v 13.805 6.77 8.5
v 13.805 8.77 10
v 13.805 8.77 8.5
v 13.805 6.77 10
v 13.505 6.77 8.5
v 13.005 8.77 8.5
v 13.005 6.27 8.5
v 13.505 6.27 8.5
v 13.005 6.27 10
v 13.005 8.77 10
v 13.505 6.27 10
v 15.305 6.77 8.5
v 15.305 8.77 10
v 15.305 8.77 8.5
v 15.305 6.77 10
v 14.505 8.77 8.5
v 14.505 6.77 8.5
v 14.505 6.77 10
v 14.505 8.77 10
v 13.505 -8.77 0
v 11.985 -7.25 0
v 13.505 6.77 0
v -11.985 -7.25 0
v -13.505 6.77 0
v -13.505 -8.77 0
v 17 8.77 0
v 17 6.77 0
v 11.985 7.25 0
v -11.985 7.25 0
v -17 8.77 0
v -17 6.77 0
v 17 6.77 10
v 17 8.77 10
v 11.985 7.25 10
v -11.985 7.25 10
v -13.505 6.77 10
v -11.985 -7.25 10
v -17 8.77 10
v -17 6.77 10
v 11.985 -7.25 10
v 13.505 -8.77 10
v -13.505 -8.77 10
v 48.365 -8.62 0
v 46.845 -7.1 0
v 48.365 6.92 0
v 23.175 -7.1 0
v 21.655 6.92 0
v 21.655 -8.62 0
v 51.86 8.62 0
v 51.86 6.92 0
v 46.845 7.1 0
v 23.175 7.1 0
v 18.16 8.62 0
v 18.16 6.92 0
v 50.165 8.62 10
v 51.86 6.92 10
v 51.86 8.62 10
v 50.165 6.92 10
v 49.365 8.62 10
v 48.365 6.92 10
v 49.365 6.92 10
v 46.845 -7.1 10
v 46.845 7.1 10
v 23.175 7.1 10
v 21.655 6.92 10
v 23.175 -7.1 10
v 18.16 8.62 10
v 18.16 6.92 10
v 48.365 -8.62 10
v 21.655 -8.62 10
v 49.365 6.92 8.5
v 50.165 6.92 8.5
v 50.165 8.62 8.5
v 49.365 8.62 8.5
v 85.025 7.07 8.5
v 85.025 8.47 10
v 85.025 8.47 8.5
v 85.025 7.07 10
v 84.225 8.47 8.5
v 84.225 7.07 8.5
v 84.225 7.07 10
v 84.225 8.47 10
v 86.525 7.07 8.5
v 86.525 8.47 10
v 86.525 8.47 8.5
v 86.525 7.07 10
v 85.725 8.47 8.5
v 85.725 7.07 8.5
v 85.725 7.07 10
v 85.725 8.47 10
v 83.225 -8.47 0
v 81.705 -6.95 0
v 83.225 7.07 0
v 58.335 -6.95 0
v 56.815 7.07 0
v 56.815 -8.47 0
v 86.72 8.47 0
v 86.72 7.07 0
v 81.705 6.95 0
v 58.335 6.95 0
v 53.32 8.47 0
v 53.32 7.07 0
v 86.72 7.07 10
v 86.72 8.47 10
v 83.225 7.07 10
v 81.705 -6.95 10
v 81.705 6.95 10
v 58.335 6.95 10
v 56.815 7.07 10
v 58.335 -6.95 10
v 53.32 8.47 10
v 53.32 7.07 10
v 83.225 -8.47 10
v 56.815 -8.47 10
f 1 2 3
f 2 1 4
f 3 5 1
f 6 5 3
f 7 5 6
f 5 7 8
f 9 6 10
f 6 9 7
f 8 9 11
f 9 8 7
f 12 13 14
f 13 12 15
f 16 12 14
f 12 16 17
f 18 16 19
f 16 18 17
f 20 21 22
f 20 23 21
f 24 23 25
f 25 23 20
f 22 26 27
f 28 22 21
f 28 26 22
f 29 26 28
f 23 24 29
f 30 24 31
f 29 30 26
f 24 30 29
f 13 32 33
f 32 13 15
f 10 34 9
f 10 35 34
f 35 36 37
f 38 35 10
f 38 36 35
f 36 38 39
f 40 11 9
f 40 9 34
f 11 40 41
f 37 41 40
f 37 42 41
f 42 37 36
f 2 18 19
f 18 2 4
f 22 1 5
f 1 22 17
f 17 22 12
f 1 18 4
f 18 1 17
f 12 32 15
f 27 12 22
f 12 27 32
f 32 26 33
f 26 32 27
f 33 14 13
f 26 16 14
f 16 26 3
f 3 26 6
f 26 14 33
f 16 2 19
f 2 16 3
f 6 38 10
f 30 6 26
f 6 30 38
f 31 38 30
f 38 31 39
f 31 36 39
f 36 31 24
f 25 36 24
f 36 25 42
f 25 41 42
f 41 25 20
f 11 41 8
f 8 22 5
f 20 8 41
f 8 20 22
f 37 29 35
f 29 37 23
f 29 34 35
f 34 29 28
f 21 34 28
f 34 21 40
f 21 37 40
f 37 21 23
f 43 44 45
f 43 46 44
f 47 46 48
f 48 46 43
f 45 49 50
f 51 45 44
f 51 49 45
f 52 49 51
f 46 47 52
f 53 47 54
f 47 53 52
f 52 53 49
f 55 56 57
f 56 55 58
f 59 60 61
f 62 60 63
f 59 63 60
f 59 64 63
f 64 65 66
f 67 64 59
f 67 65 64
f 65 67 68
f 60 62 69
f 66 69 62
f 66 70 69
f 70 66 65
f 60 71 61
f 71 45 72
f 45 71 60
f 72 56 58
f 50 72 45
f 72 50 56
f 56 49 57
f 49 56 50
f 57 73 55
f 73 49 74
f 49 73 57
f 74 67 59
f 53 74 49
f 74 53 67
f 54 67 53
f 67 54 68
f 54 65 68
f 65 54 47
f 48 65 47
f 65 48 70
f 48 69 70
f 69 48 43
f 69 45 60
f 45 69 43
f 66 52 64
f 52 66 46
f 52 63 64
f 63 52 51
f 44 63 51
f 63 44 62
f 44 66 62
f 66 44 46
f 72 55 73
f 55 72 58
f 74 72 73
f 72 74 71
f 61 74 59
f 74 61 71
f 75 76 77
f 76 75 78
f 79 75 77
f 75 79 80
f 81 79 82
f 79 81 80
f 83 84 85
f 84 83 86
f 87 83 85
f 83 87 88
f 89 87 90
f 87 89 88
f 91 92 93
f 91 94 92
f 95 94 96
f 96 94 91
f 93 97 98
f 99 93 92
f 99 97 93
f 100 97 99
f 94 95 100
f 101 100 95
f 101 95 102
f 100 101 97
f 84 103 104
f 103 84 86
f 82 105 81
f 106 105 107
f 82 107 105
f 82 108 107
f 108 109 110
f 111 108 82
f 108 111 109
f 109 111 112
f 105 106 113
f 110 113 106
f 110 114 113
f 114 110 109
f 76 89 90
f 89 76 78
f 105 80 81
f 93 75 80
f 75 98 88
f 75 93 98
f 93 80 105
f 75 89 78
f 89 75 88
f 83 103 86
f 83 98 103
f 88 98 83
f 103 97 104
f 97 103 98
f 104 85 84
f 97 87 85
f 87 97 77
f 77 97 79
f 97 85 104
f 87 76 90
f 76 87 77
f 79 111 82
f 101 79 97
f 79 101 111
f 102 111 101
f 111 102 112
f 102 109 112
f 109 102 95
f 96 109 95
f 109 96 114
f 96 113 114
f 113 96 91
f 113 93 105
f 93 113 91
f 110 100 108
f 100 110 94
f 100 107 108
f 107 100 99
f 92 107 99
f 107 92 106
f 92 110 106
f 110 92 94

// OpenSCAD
// ============================================================
// Passungs-Pruefling fuer die Einschubschiene im Badspiegel
//
// Das ist NICHT das fertige Gehaeuse, sondern nur eine 10 mm dicke
// Scheibe vom Querschnitt, dreimal nebeneinander mit unterschiedlichem
// Spiel. Zweck: in zwanzig Minuten Druckzeit herausfinden, welches Mass
// in die Schiene passt, statt nach zwei Stunden Druck zu merken, dass
// es klemmt oder wackelt.
//
// So gehts: alle drei drucken, der Reihe nach in die Schiene schieben.
// Der beste ist der, der ohne Gewalt hineingeht und nicht von selbst
// wieder herausfaellt. Seine Nummer steht eingepraegt auf der Stirnseite.
// Diese Nummer sagst du mir, dann baue ich das Gehaeuse mit dem Wert.
//
// DRUCKAUSRICHTUNG: stehend, so wie die Datei es anlegt. Dadurch ist
// jede Druckschicht exakt der Querschnitt, den wir pruefen wollen.
// Liegend gedruckt waere die Hoehe durch die Schichtdicke gerastert und
// die Messung waere nichts wert.
// Ohne Support, ohne Brim. Falls die erste Schicht breiter ausfaellt
// (Elefantenfuss), im Slicer die Elefantenfuss-Korrektur einschalten.
// ============================================================

// ---- Gemessen am Original, 14.08.2026, Messschieber ----
korpus_breite = 27.01;   // Gehaeuse aussen, breite Seite
korpus_hoehe  = 17.54;   // Gehaeuse aussen, flache Seite
wand          = 1.52;    // Wandstaerke, direkt gemessen
fluegel_dicke = 2.00;    // Dicke der seitlichen Fluegel

// Ueberstand je Seite, gerechnet aus zwei Messungen: ueber die
// Fluegelspitzen 34.00, ueber den Korpus 27.01, Differenz halbiert.
fluegel_ueberstand = 3.495;

// Die Fluegel schliessen buendig mit der Displayseite ab (16.08.2026). Ihre Mitte liegt also eine halbe Fluegeldicke unter der
// Oberkante.
fluegel_mitte_ab_display = fluegel_dicke / 2;

// ---- Pruefling-Einstellungen ----
pruefling_laenge = 10;      // Scheibendicke, reicht zum Einschieben
spiel_liste      = [0, 0.15, 0.30];  // je Seite, wird vom Mass abgezogen
abstand          = 8;       // Luecke zwischen den Prueflingen auf dem Bett

// ============================================================

// Querschnitt als 2D-Profil. spiel wird auf JEDER Seite abgezogen,
// die Aussenmasse schrumpfen also um das Doppelte.
module profil(spiel) {
    difference() {
        union() {
            square([korpus_breite - 2*spiel, korpus_hoehe - 2*spiel], center = true);
            // Fluegel links und rechts. Die Displayseite liegt hier oben,
            // also in +y, deshalb wird der Abstand von dort abgezogen.
            for (seite = [-1, 1])
                translate([seite * (korpus_breite - 2*spiel) / 2,
                           korpus_hoehe/2 - fluegel_mitte_ab_display])
                    square([2 * fluegel_ueberstand, fluegel_dicke - 2*spiel],
                           center = true);
        }
        // Hohlraum. Nur damit der Pruefling sich aehnlich verformt wie
        // das spaetere Gehaeuse und nicht als Vollklotz alles aufweitet.
        square([korpus_breite - 2*spiel - 2*wand,
                korpus_hoehe  - 2*spiel - 2*wand], center = true);
    }
}

module pruefling(spiel, nummer) {
    difference() {
        linear_extrude(height = pruefling_laenge) profil(spiel);
        // Nummer als Kerben im rechten Fluegel: 0, 1 oder 2 Kerben.
        // Bis 25.10.2026 stand hier eine eingepraegte Ziffer in der Mitte,
        // die lag im Hohlraum und kam nie aufs Teil.
        for (k = [0 : nummer - 1])
            translate([(korpus_breite - 2*spiel)/2 + 1 + k * 1.5,
                       korpus_hoehe/2 - fluegel_dicke - 0.5, pruefling_laenge - 1.5])
                cube([0.8, fluegel_dicke + 1, 2]);
    }
}

for (i = [0 : len(spiel_liste) - 1])
    translate([i * (korpus_breite + abstand), 0, 0])
        pruefling(spiel_liste[i], i);
